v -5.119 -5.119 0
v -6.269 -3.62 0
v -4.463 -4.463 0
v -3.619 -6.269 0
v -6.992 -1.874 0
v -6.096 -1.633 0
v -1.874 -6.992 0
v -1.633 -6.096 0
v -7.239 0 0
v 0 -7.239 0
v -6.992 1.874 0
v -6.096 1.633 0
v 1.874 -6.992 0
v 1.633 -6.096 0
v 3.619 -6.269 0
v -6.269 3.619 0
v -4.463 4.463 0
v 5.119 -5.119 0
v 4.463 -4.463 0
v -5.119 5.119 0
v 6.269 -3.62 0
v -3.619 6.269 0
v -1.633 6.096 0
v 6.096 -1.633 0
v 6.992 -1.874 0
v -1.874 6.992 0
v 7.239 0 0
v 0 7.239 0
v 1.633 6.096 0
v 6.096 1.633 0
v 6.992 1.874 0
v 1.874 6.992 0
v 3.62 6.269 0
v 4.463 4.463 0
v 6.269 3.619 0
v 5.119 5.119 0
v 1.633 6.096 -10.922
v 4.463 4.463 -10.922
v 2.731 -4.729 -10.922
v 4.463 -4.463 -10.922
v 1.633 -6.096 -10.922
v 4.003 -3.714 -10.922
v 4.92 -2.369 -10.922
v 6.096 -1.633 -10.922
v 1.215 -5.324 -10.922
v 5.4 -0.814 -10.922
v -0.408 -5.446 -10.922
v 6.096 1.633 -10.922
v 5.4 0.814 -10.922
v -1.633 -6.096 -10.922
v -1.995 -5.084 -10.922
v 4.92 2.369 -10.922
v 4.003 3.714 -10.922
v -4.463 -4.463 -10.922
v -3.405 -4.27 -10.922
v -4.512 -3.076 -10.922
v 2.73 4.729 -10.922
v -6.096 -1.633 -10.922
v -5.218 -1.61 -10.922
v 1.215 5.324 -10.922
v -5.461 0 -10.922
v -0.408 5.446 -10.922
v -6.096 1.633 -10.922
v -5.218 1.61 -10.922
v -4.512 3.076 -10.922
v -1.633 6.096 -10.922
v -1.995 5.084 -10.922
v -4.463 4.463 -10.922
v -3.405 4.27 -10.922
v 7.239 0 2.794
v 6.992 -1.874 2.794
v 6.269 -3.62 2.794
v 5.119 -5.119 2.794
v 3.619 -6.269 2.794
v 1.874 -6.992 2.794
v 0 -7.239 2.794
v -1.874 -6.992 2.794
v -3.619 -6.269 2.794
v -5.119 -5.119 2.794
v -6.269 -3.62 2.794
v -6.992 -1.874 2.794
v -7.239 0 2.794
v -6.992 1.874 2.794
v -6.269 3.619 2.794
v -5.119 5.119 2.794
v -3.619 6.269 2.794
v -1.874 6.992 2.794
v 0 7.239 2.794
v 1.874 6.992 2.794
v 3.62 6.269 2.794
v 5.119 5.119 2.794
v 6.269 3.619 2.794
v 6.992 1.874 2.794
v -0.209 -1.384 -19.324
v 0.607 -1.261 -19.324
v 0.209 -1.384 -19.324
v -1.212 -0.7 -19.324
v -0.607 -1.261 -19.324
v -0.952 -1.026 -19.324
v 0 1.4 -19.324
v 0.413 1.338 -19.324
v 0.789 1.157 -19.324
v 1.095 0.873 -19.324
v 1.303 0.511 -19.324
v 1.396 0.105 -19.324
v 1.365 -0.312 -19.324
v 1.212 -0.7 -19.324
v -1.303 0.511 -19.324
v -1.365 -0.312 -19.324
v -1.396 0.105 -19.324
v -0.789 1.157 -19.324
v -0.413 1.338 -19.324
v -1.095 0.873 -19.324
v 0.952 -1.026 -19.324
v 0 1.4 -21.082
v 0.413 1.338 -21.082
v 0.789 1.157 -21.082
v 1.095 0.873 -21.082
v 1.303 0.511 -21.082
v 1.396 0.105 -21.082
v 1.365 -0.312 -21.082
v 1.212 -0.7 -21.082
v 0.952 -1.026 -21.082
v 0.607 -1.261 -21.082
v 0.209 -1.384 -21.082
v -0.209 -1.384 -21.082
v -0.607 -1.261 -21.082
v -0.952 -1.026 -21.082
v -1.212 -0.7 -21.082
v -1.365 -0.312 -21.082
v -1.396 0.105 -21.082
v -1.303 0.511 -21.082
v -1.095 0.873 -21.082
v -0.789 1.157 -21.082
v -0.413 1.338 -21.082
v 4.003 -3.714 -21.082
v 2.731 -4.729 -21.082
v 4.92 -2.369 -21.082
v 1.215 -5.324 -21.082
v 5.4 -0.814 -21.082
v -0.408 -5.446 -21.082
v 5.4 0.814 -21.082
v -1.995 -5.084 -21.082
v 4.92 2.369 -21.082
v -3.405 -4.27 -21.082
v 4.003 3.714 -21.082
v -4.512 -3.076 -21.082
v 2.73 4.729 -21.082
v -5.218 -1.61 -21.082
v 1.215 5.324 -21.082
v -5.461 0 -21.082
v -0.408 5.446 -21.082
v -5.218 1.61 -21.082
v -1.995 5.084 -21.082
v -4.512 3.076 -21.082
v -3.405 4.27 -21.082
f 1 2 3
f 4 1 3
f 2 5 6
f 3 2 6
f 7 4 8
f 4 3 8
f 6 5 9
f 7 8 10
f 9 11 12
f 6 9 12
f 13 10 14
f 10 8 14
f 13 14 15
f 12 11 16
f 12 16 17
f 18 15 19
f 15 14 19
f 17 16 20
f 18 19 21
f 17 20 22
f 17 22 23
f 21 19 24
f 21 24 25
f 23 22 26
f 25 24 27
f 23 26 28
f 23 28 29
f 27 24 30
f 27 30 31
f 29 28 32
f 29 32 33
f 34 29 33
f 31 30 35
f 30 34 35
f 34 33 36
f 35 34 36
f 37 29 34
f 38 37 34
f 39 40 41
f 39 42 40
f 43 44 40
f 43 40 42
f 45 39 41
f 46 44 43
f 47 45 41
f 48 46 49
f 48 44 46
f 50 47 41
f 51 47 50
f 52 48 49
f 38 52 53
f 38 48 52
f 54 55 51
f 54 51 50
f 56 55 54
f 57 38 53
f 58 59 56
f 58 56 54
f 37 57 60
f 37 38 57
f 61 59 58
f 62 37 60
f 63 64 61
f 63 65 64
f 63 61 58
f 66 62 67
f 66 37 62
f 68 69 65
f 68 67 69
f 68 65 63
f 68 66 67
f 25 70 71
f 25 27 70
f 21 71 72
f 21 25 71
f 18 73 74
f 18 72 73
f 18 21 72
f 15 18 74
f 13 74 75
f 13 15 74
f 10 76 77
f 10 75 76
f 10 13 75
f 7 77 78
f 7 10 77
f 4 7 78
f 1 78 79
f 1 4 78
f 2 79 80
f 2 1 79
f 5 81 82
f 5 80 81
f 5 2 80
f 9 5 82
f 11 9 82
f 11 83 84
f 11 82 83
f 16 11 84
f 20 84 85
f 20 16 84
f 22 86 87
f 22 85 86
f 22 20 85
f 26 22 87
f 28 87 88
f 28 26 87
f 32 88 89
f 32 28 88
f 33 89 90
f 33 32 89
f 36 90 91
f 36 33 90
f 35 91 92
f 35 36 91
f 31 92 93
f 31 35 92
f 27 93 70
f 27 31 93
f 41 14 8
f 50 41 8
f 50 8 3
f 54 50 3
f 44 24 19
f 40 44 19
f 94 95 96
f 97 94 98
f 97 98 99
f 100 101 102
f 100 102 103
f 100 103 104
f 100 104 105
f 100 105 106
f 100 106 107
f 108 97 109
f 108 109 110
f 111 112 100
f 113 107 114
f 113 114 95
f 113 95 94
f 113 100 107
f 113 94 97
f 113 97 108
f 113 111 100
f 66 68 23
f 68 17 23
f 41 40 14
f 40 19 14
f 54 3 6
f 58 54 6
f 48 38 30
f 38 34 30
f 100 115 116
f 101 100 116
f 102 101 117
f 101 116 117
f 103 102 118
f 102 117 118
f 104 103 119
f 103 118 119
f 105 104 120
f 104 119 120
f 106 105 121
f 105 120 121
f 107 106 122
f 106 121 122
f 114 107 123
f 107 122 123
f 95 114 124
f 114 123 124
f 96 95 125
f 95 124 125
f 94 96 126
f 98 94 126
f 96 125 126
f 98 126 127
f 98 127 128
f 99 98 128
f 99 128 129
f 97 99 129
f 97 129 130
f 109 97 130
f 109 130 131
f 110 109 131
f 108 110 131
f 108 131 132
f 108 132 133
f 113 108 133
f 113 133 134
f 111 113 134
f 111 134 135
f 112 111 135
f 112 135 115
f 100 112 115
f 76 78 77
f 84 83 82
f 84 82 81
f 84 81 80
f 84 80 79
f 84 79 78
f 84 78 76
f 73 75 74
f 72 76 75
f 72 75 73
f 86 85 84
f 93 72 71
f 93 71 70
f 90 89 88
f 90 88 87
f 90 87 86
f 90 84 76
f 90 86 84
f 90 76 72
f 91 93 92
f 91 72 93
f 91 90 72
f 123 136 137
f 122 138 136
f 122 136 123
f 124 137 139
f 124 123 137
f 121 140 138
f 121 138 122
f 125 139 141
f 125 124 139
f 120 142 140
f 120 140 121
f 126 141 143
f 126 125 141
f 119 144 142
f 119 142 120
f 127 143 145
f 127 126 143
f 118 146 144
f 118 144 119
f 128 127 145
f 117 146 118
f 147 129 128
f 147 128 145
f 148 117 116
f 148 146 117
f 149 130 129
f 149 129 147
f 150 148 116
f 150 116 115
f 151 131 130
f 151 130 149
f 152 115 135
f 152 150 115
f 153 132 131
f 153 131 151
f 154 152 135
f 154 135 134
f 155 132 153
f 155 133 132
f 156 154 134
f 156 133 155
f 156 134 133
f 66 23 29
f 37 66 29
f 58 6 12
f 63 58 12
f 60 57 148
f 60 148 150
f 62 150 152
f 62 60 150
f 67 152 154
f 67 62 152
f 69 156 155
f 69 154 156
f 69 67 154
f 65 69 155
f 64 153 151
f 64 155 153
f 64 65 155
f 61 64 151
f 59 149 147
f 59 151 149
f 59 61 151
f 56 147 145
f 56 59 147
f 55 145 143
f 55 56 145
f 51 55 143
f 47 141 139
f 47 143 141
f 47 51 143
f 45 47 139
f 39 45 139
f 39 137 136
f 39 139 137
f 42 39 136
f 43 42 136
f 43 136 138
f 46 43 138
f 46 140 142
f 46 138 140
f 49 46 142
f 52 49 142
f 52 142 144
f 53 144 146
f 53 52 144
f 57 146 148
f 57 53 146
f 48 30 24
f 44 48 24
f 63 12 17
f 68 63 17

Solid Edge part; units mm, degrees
sketch "Sketch1" plane through (0, 0, 0) normal (0, 0, 1) x (1, 0, 0)
  circle A0 centre (0, 0) radius 7.239
extrude "Protrusion1" add sketch "Sketch1" along normal blind 2.794
sketch "Sketch2" plane through (0, 0, 0) normal (0, 0, -1) x (1, 0, 0)
  line L0 (4.4626, 4.4626) -> (1.6334, 6.096)
  line L1 (1.6334, 6.096) -> (-1.6334, 6.096)
  line L2 (-1.6334, 6.096) -> (-4.4626, 4.4626)
  line L3 (-4.4626, 4.4626) -> (-6.096, 1.6334)
  line L4 (-6.096, 1.6334) -> (-6.096, -1.6334)
  line L5 (-6.096, -1.6334) -> (-4.4626, -4.4626)
  line L6 (-4.4626, -4.4626) -> (-1.6334, -6.096)
  line L7 (-1.6334, -6.096) -> (1.6334, -6.096)
  line L8 (1.6334, -6.096) -> (4.4626, -4.4626)
  line L9 (4.4626, -4.4626) -> (6.096, -1.6334)
  line L10 (6.096, -1.6334) -> (6.096, 1.6334)
  line L11 (6.096, 1.6334) -> (4.4626, 4.4626)
extrude "ExtrudedProtrusion_2" add sketch "Sketch2" along normal blind 10.922
sketch "Sketch3" plane through (0, 0, -10.922) normal (0, 0, -1) x (0.5, 0.866, 0)
  circle A0 centre (0, 0) radius 5.461
extrude "ExtrudedProtrusion_3" add sketch "Sketch3" along normal blind 10.16
sketch "Sketch4" plane through (0, 0, -21.082) normal (0, 0, -1) x (0, 1, 0)
  circle A0 centre (0, 0) radius 1.4
extrude "ExtrudedCutout_1" cut sketch "Sketch4" against normal blind 1.7575
